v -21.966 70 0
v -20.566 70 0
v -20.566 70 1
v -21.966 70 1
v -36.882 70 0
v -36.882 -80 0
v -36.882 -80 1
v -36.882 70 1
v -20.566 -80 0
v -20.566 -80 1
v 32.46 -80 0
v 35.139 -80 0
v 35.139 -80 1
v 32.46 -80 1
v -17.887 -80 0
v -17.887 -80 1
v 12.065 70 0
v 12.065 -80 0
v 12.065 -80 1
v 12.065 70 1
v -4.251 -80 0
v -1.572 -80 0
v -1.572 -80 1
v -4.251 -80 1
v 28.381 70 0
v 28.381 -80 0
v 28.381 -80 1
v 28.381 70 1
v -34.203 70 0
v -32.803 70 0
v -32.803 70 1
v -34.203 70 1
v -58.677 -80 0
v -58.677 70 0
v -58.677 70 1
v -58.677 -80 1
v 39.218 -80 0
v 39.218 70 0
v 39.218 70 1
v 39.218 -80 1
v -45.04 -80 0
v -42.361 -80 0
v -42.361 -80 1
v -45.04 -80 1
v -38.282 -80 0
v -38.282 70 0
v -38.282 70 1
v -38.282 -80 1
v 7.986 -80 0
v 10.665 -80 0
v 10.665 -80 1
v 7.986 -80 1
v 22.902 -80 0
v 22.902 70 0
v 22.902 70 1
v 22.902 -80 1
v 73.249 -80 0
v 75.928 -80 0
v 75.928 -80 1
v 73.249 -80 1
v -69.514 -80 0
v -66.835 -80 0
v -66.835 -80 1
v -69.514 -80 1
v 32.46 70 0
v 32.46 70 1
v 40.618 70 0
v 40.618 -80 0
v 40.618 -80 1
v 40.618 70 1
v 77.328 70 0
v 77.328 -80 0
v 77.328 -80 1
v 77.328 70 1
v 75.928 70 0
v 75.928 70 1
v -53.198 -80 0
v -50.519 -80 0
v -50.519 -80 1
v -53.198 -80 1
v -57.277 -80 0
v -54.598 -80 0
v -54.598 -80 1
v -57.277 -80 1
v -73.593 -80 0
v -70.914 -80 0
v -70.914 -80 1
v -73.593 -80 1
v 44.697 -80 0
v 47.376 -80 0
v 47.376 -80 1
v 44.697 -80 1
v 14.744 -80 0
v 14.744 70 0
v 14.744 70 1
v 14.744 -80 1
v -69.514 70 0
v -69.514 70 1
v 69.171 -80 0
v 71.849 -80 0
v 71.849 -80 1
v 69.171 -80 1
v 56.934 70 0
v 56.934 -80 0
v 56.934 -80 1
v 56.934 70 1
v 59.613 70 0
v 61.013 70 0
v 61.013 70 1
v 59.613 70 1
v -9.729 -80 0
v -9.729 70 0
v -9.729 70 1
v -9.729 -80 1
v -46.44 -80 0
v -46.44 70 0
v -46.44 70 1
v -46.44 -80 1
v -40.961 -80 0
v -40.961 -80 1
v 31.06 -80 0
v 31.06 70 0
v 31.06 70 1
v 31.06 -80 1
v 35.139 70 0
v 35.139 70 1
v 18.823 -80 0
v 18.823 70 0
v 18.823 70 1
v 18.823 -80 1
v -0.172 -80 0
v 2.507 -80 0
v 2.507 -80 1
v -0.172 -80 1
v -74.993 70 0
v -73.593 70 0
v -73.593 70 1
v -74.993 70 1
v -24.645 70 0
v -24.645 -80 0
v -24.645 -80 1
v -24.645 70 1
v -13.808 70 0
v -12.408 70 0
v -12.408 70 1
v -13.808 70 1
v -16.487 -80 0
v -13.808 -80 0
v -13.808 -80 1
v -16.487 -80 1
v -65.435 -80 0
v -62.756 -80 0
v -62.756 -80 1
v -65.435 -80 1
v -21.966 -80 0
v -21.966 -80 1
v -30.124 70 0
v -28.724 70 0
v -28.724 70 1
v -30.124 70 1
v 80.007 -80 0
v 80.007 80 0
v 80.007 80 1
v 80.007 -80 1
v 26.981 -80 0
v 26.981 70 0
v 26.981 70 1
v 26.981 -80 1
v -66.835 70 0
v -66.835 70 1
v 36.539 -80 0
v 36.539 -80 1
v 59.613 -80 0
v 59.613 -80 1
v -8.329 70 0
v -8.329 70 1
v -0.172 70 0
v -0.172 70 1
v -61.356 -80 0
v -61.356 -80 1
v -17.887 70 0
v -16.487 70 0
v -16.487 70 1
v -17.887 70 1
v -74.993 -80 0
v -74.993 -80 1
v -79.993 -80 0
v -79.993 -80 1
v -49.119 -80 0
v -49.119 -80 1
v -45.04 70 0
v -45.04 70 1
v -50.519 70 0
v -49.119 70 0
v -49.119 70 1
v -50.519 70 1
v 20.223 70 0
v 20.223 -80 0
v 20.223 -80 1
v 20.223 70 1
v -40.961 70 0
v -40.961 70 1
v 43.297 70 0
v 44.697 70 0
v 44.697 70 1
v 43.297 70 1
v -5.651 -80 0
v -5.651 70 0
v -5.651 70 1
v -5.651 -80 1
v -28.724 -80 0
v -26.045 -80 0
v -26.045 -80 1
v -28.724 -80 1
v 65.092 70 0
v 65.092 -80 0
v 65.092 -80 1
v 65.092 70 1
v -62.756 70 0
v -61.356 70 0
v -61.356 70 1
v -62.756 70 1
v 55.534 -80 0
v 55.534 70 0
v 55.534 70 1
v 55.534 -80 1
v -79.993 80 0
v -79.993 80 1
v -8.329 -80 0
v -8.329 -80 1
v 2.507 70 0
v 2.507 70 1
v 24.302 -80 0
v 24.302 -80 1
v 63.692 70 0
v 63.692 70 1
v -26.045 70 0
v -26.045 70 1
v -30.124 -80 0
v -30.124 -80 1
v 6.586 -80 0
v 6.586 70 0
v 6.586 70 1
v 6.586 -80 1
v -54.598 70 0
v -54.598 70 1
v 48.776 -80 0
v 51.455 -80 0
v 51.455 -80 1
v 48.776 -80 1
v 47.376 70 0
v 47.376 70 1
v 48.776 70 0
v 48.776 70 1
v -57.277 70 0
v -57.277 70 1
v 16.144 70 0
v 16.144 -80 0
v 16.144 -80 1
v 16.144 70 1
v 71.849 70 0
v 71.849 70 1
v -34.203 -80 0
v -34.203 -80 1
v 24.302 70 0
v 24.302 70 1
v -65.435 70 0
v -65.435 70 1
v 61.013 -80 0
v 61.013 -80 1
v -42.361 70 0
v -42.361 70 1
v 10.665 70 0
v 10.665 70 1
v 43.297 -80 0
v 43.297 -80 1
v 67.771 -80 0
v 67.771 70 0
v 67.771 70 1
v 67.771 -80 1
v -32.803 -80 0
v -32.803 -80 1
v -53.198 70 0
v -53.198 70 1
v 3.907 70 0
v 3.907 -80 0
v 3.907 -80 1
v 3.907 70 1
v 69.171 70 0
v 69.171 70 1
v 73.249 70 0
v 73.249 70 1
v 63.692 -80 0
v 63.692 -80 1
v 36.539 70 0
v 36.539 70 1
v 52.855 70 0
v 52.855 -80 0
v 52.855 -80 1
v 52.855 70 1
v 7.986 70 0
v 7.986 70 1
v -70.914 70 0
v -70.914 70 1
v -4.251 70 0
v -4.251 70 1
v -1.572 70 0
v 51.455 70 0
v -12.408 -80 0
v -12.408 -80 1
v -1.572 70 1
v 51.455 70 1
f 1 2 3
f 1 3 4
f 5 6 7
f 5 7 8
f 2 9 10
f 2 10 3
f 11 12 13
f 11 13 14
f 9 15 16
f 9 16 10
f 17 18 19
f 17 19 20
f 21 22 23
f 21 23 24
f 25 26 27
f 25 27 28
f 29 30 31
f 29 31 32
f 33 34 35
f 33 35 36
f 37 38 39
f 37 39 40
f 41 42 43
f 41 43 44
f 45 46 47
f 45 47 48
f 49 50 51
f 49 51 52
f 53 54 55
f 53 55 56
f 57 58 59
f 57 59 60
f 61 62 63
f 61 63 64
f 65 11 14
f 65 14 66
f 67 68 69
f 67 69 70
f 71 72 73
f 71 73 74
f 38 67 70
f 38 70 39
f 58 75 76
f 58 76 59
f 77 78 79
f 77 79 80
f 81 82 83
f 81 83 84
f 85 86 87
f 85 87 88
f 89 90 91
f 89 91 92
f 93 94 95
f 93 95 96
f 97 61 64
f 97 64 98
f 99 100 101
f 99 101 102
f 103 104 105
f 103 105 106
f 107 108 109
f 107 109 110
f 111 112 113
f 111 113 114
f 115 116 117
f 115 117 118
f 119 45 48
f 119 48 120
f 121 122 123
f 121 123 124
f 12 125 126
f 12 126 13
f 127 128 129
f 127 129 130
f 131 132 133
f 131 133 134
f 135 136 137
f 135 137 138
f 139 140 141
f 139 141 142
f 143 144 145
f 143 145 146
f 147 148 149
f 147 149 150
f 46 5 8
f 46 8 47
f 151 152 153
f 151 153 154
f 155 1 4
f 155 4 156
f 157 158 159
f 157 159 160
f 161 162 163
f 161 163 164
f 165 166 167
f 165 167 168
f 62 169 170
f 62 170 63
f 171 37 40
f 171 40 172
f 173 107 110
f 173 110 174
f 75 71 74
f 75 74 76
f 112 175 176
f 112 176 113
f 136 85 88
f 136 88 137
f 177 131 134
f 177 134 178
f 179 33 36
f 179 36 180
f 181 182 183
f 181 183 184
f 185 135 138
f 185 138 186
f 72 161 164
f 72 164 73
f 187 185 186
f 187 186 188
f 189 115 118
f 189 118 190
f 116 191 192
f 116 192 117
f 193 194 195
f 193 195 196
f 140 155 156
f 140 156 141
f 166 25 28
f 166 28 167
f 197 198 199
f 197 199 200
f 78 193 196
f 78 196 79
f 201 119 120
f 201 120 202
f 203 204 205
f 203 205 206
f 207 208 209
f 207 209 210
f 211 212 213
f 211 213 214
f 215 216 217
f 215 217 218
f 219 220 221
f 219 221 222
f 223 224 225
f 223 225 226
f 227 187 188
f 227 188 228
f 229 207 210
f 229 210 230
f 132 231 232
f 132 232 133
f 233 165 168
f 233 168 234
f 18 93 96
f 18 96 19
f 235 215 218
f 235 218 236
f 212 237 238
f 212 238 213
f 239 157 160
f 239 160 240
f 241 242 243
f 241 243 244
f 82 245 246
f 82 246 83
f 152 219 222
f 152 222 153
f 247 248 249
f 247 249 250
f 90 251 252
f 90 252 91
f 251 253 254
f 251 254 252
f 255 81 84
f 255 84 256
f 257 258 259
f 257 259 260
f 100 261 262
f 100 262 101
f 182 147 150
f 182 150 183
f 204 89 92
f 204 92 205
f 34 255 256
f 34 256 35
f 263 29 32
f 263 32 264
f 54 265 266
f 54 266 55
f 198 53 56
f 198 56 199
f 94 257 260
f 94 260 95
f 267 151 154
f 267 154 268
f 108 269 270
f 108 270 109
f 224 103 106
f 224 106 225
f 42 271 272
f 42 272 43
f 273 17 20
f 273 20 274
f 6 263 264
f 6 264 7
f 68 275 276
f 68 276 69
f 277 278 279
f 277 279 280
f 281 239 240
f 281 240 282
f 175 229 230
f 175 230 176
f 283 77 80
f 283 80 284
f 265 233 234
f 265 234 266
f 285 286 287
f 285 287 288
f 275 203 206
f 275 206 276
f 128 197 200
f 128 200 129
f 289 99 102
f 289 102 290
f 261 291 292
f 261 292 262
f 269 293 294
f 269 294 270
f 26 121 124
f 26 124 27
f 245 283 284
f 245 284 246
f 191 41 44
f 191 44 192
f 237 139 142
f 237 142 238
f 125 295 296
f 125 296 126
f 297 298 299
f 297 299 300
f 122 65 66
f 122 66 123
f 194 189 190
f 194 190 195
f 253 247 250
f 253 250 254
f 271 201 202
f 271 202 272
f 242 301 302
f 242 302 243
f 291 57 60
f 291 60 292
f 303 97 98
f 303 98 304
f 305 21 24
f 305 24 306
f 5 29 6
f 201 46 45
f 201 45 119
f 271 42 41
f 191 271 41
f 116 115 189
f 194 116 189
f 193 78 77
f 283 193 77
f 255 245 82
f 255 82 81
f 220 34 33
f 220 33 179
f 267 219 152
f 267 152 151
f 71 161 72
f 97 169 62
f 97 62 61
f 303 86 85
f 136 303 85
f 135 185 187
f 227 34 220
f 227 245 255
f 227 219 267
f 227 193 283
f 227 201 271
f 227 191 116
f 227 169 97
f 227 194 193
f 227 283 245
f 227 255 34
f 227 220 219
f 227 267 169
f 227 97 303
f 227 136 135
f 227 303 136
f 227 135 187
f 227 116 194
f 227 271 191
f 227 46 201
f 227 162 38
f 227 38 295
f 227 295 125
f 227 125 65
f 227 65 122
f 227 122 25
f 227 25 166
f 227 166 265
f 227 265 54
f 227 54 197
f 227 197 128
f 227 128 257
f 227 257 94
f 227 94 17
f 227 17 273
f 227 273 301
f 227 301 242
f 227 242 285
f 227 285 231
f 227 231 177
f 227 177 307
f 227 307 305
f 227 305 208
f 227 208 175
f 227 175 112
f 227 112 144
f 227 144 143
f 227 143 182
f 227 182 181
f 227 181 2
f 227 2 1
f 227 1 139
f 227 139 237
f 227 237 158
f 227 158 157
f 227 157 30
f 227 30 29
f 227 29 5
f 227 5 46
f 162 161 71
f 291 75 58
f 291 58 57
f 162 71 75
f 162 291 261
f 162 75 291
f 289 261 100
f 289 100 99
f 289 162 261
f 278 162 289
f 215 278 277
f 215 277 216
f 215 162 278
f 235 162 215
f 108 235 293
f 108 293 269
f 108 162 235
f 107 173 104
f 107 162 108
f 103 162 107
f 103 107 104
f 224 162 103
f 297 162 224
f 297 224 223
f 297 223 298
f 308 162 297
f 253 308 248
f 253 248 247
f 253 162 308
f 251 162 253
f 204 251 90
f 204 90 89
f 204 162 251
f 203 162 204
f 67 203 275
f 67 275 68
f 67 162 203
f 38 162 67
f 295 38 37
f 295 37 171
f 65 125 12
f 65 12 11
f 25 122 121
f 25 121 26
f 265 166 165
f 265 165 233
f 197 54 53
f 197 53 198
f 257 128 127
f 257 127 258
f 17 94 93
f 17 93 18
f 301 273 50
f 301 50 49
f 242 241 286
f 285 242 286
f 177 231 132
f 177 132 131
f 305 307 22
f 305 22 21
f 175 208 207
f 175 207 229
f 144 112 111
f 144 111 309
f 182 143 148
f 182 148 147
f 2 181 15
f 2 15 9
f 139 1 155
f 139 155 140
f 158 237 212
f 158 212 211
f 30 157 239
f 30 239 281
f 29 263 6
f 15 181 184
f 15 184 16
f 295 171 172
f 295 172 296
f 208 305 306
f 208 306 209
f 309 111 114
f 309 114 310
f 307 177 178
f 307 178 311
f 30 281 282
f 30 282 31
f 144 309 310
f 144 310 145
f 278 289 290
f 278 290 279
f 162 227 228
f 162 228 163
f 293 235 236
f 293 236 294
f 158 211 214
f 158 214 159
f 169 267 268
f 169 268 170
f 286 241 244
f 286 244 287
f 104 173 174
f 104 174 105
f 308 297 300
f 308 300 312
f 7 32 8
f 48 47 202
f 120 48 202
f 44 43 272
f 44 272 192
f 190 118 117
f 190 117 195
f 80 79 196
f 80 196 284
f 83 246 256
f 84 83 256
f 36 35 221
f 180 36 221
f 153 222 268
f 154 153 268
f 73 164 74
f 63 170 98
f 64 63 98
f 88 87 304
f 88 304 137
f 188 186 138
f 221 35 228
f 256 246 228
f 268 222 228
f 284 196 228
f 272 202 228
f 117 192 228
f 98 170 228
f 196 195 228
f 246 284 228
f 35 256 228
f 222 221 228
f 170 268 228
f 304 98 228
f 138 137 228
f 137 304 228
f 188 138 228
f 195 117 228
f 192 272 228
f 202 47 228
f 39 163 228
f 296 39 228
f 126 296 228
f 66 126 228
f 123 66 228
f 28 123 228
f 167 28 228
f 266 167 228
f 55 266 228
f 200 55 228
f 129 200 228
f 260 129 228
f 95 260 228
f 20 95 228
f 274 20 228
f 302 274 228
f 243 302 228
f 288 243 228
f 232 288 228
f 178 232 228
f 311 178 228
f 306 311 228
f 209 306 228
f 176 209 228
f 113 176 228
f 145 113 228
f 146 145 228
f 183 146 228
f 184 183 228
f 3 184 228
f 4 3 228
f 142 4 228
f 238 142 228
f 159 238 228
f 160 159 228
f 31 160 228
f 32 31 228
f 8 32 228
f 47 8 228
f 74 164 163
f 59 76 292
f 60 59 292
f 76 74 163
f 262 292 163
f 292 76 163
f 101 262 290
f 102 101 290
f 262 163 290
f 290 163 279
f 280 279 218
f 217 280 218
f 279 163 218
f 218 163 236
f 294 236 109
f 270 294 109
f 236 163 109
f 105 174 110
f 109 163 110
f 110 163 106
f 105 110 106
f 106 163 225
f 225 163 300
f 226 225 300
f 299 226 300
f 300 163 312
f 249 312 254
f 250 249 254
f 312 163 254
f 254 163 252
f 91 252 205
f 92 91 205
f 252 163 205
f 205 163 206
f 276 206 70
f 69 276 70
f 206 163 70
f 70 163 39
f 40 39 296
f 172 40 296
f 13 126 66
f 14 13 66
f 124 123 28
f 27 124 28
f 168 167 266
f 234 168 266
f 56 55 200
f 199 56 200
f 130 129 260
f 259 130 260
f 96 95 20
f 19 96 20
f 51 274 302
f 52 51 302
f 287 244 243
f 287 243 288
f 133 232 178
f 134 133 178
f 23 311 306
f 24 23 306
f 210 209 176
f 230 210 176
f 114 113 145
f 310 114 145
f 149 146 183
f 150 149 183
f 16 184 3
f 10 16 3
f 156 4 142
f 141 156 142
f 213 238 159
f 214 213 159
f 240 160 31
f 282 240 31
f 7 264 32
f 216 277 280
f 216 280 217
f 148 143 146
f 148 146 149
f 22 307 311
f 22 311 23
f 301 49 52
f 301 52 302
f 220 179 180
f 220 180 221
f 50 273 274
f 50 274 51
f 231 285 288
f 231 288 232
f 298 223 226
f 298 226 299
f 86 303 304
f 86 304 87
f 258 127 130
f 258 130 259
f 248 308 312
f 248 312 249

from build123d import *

# Parameters (mm, degrees)
EXTRUDE_2_DEPTH = 1


with BuildPart() as part:
    # 草图1 → 凸台-拉伸2 (new body)
    with BuildSketch(Plane.XY):
        Polygon((-74.992657391, 70), (-74.992657391, -80), (-79.992657391, -80), (-79.992657391, 80), (80.007342609, 80), (80.007342609, -80), (77.328395241, -80), (77.328395241, 70), (75.928395241, 70), (75.928395241, -80), (73.249447872, -80), (73.249447872, 70), (71.849447872, 70), (71.849447872, -80), (69.170500504, -80), (69.170500504, 70), (67.770500504, 70), (67.770500504, -80), (65.091553135, -80), (65.091553135, 70), (63.691553135, 70), (63.691553135, -80), (61.012605767, -80), (61.012605767, 70), (59.612605767, 70), (59.612605767, -80), (56.933658398, -80), (56.933658398, 70), (55.533658398, 70), (55.533658398, -80), (52.85471103, -80), (52.85471103, 70), (51.45471103, 70), (51.45471103, -80), (48.775763662, -80), (48.775763662, 70), (47.375763662, 70), (47.375763662, -80), (44.696816293, -80), (44.696816293, 70), (43.296816293, 70), (43.296816293, -80), (40.617868925, -80), (40.617868925, 70), (39.217868925, 70), (39.217868925, -80), (36.538921556, -80), (36.538921556, 70), (35.138921556, 70), (35.138921556, -80), (32.459974188, -80), (32.459974188, 70), (31.059974188, 70), (31.059974188, -80), (28.381026819, -80), (28.381026819, 70), (26.981026819, 70), (26.981026819, -80), (24.302079451, -80), (24.302079451, 70), (22.902079451, 70), (22.902079451, -80), (20.223132083, -80), (20.223132083, 70), (18.823132083, 70), (18.823132083, -80), (16.144184714, -80), (16.144184714, 70), (14.744184714, 70), (14.744184714, -80), (12.065237346, -80), (12.065237346, 70), (10.665237346, 70), (10.665237346, -80), (7.986289977, -80), (7.986289977, 70), (6.586289977, 70), (6.586289977, -80), (3.907342609, -80), (3.907342609, 70), (2.507342609, 70), (2.507342609, -80), (-0.171604759, -80), (-0.171604759, 70), (-1.571604759, 70), (-1.571604759, -80), (-4.250552128, -80), (-4.250552128, 70), (-5.650552128, 70), (-5.650552128, -80), (-8.329499496, -80), (-8.329499496, 70), (-9.729499496, 70), (-9.729499496, -80), (-12.408446865, -80), (-12.408446865, 70), (-13.808446865, 70), (-13.808446865, -80), (-16.487394233, -80), (-16.487394233, 70), (-17.887394233, 70), (-17.887394233, -80), (-20.566341602, -80), (-20.566341602, 70), (-21.966341602, 70), (-21.966341602, -80), (-24.64528897, -80), (-24.64528897, 70), (-26.04528897, 70), (-26.04528897, -80), (-28.724236338, -80), (-28.724236338, 70), (-30.124236338, 70), (-30.124236338, -80), (-32.803183707, -80), (-32.803183707, 70), (-34.203183707, 70), (-34.203183707, -80), (-36.882131075, -80), (-36.882131075, 70), (-38.282131075, 70), (-38.282131075, -80), (-40.961078444, -80), (-40.961078444, 70), (-42.361078444, 70), (-42.361078444, -80), (-45.040025812, -80), (-45.040025812, 70), (-46.440025812, 70), (-46.440025812, -80), (-49.118973181, -80), (-49.118973181, 70), (-50.518973181, 70), (-50.518973181, -80), (-53.197920549, -80), (-53.197920549, 70), (-54.597920549, 70), (-54.597920549, -80), (-57.276867917, -80), (-57.276867917, 70), (-58.676867917, 70), (-58.676867917, -80), (-61.355815286, -80), (-61.355815286, 70), (-62.755815286, 70), (-62.755815286, -80), (-65.434762654, -80), (-65.434762654, 70), (-66.834762654, 70), (-66.834762654, -80), (-69.513710023, -80), (-69.513710023, 70), (-70.913710023, 70), (-70.913710023, -80), (-73.592657391, -80), (-73.592657391, 70), align=None)
    extrude(amount=EXTRUDE_2_DEPTH)


solid = part.part
